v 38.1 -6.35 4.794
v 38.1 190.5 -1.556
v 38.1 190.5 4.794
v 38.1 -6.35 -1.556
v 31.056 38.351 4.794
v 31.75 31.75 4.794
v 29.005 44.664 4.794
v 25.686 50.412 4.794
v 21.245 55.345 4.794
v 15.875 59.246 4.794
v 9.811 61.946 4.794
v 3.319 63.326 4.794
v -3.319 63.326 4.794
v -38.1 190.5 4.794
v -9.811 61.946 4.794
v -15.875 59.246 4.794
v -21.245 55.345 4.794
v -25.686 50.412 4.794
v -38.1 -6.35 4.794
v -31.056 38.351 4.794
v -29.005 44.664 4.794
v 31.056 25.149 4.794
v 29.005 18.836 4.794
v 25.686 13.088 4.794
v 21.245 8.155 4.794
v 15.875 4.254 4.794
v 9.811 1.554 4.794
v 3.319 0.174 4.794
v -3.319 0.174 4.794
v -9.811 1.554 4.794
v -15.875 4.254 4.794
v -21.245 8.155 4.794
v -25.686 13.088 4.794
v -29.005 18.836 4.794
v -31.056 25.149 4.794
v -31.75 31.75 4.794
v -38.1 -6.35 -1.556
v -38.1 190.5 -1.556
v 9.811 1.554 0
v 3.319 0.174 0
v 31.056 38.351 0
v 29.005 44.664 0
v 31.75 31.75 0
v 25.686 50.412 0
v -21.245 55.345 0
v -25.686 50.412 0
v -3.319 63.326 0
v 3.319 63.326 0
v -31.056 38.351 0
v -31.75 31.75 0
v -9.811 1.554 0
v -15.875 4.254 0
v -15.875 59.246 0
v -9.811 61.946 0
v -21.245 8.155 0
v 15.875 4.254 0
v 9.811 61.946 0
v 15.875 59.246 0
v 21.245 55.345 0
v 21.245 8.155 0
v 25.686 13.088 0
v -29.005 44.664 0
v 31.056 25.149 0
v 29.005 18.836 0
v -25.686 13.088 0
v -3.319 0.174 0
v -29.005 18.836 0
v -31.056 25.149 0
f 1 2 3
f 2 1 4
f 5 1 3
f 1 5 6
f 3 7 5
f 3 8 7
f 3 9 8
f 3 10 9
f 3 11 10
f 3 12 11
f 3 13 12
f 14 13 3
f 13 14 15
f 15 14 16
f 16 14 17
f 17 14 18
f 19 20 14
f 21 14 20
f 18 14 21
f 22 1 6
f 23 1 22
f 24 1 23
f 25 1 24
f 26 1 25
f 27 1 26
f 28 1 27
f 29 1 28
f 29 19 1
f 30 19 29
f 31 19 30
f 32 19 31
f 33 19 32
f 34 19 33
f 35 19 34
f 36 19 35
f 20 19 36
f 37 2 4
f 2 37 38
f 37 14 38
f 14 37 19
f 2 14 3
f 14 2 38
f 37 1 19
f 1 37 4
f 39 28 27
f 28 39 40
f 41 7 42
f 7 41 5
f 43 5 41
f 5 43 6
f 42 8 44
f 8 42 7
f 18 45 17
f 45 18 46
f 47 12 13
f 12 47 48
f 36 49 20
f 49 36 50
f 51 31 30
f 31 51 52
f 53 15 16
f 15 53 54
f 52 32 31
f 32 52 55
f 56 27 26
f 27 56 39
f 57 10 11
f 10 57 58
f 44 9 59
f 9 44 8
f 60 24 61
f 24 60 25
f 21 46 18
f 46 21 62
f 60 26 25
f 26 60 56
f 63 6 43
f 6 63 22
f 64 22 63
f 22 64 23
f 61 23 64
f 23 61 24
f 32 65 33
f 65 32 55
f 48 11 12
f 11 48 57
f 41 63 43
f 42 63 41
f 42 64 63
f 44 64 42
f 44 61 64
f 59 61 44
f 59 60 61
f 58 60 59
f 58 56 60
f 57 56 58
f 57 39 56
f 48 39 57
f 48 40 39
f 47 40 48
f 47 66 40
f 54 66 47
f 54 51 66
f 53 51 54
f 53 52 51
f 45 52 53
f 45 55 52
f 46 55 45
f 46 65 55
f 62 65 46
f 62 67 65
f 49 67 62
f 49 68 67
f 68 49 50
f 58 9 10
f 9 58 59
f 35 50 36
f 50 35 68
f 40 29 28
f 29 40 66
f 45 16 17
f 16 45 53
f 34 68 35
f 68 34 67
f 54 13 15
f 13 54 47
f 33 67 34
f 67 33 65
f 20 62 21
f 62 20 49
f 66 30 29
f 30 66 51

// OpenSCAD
baseRadius = 2.5 * 0.5 * 25.4;
depth = 7.25 * 25.4;
height = 0.25 * 25.4;

blockWidth = 3 * 25.4;
blockDepth = 7.75 * 25.4;
blockHeight = 0.25 * 25.4;
inset = 0.25 * 25.4;
baseInset = 0.06125 * 25.4;

grooveWidth = 0.025 * 25.4;

difference() {
    translate([-blockWidth * 0.5, -inset, -baseInset])
    cube([blockWidth, blockDepth, blockHeight]);
    
    translate([0, baseRadius, 0])
    cylinder(r1=baseRadius, r2=baseRadius, h=height+0.01);
}
